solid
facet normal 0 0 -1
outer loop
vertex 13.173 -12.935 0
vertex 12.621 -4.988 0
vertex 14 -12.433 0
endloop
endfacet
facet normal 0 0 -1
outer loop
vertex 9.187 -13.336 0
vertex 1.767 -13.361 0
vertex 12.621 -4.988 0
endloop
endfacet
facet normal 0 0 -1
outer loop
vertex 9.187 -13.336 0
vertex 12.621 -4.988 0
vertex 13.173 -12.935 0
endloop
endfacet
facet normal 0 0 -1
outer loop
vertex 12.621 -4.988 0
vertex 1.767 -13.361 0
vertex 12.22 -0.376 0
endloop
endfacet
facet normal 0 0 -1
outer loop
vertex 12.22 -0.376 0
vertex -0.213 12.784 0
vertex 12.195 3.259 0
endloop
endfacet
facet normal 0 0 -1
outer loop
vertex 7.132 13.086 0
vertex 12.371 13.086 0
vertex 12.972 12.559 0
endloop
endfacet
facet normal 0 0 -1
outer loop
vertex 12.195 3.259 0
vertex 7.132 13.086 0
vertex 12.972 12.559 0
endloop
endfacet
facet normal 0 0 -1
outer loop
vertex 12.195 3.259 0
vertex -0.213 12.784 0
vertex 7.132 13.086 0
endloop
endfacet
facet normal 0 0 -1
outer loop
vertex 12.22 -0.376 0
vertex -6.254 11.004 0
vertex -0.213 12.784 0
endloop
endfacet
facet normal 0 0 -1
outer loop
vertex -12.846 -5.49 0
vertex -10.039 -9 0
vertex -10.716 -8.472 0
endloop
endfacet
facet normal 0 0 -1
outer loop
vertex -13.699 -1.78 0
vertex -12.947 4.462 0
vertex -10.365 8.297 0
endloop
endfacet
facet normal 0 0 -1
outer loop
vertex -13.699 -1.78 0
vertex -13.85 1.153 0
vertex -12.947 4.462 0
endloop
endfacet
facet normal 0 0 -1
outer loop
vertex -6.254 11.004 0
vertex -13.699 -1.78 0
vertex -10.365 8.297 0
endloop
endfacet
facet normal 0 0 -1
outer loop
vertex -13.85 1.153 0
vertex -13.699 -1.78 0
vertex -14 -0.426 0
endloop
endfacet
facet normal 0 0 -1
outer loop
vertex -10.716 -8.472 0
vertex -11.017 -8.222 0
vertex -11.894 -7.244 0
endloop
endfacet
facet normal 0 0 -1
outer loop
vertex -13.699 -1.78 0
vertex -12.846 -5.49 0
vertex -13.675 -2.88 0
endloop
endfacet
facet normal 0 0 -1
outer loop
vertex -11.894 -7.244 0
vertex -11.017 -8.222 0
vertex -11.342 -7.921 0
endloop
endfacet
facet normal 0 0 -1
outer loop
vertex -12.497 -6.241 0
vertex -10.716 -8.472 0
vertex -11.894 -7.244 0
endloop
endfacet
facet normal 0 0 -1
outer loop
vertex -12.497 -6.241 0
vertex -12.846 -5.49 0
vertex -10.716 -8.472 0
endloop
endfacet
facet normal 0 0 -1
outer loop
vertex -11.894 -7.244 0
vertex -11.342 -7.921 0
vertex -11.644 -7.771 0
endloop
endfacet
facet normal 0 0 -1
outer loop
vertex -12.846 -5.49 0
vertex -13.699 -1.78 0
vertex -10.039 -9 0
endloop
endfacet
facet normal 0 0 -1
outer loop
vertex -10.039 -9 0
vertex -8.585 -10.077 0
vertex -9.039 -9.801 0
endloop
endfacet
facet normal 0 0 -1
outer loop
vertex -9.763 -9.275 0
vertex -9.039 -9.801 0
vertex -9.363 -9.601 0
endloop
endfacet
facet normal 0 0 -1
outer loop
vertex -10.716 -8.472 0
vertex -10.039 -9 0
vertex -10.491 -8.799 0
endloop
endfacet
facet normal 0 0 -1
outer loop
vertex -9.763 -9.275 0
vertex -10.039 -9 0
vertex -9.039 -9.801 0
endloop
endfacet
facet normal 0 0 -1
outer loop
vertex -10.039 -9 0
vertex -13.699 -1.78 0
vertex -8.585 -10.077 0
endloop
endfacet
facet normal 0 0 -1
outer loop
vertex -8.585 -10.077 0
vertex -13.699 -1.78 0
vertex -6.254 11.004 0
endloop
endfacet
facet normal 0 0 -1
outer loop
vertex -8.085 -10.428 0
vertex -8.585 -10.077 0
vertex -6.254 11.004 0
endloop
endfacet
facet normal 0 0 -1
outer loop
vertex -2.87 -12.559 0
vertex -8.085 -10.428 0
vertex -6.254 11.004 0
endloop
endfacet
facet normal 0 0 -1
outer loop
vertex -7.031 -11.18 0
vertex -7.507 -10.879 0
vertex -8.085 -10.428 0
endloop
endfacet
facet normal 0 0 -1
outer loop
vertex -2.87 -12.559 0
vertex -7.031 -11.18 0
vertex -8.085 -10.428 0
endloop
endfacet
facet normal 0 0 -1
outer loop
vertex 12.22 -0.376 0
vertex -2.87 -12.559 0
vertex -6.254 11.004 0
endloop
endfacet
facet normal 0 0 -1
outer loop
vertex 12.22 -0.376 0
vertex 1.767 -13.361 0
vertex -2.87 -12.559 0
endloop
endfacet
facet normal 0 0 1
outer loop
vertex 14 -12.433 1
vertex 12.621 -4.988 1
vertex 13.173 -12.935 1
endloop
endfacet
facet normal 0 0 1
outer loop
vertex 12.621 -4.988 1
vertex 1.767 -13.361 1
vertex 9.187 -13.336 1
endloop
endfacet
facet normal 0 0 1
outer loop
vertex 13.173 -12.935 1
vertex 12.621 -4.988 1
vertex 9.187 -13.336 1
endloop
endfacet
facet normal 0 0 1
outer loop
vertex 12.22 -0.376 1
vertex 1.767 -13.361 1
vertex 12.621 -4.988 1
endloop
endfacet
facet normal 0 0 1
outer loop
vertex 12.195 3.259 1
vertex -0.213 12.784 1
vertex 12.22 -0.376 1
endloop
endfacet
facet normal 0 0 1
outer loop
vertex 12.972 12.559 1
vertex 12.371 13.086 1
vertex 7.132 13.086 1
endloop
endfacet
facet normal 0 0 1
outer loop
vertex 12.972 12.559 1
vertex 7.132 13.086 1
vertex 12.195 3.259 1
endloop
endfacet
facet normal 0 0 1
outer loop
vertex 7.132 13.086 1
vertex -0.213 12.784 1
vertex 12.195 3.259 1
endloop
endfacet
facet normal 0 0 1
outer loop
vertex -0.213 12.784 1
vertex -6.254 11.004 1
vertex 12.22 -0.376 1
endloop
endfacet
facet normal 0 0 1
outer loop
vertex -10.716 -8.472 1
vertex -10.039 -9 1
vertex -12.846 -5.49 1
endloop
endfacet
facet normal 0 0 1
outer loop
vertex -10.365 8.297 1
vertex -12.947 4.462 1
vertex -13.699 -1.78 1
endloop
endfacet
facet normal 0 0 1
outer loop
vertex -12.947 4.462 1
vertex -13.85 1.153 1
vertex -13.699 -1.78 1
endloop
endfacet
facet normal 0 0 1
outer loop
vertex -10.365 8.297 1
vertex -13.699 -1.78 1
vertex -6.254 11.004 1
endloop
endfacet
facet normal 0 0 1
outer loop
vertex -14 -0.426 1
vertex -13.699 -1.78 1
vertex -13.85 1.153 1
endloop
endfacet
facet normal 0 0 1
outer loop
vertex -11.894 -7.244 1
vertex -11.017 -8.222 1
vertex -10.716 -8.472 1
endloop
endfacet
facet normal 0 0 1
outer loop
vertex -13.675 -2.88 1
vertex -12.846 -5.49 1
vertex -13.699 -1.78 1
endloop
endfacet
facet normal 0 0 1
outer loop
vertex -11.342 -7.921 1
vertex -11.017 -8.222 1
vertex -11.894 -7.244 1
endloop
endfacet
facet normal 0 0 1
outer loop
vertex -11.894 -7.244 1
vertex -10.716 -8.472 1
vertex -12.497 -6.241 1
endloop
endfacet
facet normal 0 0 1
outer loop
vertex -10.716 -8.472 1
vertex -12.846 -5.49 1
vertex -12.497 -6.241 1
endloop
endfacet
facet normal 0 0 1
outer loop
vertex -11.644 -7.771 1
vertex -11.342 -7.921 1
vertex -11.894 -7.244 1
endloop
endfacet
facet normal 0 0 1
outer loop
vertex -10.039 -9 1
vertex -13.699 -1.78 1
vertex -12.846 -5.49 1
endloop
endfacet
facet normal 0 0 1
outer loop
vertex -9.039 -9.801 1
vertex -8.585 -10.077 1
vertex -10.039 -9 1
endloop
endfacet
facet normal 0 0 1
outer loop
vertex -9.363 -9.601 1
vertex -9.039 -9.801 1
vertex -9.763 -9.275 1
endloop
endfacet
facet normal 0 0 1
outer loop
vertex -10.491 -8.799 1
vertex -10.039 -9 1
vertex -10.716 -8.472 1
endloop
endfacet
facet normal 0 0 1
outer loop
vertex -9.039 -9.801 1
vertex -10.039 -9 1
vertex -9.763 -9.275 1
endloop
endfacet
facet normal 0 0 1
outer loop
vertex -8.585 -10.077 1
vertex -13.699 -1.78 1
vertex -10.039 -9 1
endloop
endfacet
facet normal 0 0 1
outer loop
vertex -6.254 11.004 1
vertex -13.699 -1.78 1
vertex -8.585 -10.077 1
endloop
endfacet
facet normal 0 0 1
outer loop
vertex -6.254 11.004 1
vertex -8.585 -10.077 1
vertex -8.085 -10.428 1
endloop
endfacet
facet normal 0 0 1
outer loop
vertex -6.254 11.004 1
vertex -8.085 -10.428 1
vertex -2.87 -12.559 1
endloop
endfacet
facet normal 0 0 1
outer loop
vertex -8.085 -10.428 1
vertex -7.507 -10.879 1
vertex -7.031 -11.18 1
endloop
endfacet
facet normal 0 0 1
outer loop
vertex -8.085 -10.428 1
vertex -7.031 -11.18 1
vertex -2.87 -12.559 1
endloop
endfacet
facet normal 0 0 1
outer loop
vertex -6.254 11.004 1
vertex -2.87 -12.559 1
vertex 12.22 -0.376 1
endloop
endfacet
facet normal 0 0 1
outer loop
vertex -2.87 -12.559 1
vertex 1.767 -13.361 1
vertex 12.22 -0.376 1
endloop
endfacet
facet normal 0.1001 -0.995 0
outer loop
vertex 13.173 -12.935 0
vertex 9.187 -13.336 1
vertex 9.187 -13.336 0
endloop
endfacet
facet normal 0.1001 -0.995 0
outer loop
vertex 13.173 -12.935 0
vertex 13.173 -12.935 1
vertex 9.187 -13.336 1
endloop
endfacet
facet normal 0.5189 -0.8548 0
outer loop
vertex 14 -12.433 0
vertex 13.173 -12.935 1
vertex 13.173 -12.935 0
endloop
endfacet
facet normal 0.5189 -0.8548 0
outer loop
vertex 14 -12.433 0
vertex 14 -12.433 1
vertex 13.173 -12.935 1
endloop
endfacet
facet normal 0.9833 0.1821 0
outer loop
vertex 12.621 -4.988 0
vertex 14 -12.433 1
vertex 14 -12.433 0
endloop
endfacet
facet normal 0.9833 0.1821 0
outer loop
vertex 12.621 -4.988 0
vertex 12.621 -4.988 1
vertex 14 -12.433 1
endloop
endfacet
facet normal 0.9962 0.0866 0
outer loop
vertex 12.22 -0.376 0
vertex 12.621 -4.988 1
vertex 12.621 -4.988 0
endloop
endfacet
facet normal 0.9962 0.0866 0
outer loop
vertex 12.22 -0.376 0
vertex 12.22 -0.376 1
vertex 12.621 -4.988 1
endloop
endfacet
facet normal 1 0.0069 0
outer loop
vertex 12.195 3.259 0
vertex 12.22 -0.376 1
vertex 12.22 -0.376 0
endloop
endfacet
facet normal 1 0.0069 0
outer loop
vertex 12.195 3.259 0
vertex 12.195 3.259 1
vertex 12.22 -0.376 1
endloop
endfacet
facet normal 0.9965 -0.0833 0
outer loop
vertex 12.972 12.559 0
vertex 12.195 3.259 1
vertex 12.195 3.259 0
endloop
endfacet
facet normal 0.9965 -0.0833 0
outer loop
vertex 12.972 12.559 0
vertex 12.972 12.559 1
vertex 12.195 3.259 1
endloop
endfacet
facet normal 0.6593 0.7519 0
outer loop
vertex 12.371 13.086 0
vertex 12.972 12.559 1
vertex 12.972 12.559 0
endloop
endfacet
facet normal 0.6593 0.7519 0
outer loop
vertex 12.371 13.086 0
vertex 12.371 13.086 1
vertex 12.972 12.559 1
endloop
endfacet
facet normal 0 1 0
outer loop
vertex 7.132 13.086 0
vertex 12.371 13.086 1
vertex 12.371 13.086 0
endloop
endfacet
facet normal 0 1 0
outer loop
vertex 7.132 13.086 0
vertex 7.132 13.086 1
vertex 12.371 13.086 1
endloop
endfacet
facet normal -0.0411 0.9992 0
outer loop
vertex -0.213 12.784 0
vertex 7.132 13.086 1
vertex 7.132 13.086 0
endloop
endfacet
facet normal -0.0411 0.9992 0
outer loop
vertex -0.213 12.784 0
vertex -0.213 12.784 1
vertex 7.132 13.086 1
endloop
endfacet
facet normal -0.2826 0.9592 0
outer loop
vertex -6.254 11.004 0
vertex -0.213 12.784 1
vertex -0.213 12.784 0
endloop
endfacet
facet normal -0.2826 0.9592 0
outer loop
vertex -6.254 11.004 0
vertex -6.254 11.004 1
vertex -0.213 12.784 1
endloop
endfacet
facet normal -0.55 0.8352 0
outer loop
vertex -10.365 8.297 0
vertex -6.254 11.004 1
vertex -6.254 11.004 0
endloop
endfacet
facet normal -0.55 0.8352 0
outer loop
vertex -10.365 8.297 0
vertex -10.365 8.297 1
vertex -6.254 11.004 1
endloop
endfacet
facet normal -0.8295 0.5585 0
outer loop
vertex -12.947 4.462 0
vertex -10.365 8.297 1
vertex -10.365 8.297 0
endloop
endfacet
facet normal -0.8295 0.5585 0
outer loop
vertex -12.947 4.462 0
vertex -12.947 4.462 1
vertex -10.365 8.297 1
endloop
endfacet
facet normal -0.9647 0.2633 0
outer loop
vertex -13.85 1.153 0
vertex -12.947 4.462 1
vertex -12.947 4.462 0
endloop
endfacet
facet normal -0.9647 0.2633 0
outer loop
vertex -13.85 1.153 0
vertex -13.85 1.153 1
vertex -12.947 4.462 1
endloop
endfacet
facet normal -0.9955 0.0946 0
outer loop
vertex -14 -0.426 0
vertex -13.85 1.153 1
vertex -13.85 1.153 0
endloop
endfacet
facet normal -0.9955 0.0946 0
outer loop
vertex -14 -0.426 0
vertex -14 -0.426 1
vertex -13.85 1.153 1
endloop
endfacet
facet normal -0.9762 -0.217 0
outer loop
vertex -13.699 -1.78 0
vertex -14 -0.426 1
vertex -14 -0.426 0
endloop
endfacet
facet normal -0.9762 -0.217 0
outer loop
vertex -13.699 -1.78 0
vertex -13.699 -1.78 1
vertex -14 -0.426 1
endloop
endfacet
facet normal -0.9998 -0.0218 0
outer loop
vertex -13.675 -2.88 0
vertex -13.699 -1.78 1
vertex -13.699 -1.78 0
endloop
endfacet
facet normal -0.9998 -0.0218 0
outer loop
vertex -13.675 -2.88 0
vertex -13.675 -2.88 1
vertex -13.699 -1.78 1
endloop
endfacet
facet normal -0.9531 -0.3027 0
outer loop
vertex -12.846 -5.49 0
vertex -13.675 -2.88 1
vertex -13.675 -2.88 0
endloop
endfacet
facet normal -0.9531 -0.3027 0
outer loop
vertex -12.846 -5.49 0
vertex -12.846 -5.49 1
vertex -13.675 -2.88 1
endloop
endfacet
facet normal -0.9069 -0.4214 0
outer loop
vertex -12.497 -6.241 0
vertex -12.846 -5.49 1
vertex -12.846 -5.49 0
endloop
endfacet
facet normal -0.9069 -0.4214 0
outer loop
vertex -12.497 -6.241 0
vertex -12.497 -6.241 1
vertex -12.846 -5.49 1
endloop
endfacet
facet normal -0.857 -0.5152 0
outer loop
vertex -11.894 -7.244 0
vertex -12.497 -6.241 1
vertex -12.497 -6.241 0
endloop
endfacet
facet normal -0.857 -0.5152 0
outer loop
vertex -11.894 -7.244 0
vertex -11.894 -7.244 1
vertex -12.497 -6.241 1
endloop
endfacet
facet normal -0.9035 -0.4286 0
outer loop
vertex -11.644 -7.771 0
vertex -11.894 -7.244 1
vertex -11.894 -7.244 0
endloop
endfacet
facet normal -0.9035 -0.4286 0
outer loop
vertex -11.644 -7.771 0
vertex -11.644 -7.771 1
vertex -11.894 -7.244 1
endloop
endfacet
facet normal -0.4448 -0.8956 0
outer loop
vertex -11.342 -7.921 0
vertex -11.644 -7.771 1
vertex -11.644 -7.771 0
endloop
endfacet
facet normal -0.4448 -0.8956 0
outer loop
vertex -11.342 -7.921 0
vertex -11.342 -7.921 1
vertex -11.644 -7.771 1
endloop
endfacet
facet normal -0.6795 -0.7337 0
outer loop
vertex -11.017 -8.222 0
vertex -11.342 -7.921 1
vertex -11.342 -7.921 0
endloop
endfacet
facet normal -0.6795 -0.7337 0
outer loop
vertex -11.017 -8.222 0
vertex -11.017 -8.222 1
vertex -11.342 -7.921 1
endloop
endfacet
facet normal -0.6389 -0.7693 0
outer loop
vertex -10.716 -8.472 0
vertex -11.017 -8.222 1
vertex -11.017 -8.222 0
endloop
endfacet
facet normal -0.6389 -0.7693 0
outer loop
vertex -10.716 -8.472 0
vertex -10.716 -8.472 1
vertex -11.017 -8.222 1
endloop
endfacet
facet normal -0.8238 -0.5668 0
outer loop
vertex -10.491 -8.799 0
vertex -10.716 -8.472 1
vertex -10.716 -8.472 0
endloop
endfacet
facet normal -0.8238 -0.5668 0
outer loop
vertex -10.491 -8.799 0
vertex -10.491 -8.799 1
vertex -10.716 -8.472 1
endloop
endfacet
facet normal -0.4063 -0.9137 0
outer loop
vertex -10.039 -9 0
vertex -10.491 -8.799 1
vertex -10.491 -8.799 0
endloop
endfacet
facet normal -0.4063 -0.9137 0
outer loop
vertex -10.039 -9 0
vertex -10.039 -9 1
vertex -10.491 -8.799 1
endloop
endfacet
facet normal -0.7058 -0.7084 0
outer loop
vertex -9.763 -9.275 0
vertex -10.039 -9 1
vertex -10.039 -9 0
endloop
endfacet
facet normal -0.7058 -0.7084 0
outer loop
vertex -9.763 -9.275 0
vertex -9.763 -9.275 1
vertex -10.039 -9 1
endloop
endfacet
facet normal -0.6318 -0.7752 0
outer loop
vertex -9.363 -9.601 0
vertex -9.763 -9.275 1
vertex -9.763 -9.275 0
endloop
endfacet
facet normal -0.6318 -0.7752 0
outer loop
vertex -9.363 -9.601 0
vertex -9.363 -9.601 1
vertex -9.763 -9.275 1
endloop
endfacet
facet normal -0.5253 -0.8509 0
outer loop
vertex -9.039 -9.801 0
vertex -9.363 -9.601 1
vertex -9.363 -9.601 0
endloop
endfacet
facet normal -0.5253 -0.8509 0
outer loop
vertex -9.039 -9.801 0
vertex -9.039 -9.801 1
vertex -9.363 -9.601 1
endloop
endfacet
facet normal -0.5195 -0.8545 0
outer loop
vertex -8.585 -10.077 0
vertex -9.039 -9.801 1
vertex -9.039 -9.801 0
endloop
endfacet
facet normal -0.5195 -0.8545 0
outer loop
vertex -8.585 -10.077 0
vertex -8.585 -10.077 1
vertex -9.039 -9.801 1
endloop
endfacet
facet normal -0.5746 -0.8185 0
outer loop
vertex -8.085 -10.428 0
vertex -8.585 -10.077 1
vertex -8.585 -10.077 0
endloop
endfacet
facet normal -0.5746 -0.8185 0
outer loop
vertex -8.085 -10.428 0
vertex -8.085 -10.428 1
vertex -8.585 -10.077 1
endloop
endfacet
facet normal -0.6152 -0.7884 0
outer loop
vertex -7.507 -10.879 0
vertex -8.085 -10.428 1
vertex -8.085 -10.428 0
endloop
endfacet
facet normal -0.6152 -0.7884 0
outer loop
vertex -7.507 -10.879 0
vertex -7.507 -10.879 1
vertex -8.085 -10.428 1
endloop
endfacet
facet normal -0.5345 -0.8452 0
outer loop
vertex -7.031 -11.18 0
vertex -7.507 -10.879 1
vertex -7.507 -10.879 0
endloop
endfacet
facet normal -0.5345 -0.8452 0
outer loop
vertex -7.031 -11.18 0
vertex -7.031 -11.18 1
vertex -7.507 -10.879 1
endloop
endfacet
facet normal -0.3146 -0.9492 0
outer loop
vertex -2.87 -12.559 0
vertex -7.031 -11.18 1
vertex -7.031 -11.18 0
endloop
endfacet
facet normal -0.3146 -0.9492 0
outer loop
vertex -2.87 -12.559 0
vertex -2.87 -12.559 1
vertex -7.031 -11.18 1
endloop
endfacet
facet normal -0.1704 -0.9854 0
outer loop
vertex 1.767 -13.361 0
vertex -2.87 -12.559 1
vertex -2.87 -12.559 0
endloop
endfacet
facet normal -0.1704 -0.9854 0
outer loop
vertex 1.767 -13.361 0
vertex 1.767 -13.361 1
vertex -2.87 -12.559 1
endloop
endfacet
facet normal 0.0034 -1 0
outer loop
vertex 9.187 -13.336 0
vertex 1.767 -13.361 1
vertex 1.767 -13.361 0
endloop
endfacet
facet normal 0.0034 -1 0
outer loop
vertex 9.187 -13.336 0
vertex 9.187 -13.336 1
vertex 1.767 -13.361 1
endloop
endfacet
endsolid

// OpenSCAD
/*
Traced from the supplied overhead photograph.

Overall width: 28.0 mm
Approximate height from photograph: 26.722 mm
Thickness: 1.0 mm

The photograph provides reliable plan-view geometry but not reliable
depth information for the molded-looking surface features, so this model
reproduces the outside profile as a uniform 1 mm thick part.
*/

part_width = 28.0;
part_thickness = 1.0;

module plastic_piece_2d() {
    polygon(points=[
        [12.972, 12.559],
        [12.371, 13.086],
        [11.769, 13.086],
        [7.132, 13.086],
        [-0.213, 12.784],
        [-6.254, 11.004],
        [-10.365, 8.297],
        [-12.947, 4.462],
        [-13.850, 1.153],
        [-14.000, -0.426],
        [-13.699, -1.780],
        [-13.675, -2.880],
        [-12.846, -5.490],
        [-12.497, -6.241],
        [-11.894, -7.244],
        [-11.644, -7.771],
        [-11.342, -7.921],
        [-11.017, -8.222],
        [-10.716, -8.472],
        [-10.491, -8.799],
        [-10.039, -9.000],
        [-9.763, -9.275],
        [-9.363, -9.601],
        [-9.039, -9.801],
        [-8.585, -10.077],
        [-8.085, -10.428],
        [-7.507, -10.879],
        [-7.031, -11.180],
        [-2.870, -12.559],
        [1.767, -13.361],
        [9.187, -13.336],
        [13.173, -12.935],
        [14.000, -12.433],
        [12.621, -4.988],
        [12.220, -0.376],
        [12.195, 3.259]
    ]);
}

linear_extrude(height=part_thickness, convexity=10)
    plastic_piece_2d();
